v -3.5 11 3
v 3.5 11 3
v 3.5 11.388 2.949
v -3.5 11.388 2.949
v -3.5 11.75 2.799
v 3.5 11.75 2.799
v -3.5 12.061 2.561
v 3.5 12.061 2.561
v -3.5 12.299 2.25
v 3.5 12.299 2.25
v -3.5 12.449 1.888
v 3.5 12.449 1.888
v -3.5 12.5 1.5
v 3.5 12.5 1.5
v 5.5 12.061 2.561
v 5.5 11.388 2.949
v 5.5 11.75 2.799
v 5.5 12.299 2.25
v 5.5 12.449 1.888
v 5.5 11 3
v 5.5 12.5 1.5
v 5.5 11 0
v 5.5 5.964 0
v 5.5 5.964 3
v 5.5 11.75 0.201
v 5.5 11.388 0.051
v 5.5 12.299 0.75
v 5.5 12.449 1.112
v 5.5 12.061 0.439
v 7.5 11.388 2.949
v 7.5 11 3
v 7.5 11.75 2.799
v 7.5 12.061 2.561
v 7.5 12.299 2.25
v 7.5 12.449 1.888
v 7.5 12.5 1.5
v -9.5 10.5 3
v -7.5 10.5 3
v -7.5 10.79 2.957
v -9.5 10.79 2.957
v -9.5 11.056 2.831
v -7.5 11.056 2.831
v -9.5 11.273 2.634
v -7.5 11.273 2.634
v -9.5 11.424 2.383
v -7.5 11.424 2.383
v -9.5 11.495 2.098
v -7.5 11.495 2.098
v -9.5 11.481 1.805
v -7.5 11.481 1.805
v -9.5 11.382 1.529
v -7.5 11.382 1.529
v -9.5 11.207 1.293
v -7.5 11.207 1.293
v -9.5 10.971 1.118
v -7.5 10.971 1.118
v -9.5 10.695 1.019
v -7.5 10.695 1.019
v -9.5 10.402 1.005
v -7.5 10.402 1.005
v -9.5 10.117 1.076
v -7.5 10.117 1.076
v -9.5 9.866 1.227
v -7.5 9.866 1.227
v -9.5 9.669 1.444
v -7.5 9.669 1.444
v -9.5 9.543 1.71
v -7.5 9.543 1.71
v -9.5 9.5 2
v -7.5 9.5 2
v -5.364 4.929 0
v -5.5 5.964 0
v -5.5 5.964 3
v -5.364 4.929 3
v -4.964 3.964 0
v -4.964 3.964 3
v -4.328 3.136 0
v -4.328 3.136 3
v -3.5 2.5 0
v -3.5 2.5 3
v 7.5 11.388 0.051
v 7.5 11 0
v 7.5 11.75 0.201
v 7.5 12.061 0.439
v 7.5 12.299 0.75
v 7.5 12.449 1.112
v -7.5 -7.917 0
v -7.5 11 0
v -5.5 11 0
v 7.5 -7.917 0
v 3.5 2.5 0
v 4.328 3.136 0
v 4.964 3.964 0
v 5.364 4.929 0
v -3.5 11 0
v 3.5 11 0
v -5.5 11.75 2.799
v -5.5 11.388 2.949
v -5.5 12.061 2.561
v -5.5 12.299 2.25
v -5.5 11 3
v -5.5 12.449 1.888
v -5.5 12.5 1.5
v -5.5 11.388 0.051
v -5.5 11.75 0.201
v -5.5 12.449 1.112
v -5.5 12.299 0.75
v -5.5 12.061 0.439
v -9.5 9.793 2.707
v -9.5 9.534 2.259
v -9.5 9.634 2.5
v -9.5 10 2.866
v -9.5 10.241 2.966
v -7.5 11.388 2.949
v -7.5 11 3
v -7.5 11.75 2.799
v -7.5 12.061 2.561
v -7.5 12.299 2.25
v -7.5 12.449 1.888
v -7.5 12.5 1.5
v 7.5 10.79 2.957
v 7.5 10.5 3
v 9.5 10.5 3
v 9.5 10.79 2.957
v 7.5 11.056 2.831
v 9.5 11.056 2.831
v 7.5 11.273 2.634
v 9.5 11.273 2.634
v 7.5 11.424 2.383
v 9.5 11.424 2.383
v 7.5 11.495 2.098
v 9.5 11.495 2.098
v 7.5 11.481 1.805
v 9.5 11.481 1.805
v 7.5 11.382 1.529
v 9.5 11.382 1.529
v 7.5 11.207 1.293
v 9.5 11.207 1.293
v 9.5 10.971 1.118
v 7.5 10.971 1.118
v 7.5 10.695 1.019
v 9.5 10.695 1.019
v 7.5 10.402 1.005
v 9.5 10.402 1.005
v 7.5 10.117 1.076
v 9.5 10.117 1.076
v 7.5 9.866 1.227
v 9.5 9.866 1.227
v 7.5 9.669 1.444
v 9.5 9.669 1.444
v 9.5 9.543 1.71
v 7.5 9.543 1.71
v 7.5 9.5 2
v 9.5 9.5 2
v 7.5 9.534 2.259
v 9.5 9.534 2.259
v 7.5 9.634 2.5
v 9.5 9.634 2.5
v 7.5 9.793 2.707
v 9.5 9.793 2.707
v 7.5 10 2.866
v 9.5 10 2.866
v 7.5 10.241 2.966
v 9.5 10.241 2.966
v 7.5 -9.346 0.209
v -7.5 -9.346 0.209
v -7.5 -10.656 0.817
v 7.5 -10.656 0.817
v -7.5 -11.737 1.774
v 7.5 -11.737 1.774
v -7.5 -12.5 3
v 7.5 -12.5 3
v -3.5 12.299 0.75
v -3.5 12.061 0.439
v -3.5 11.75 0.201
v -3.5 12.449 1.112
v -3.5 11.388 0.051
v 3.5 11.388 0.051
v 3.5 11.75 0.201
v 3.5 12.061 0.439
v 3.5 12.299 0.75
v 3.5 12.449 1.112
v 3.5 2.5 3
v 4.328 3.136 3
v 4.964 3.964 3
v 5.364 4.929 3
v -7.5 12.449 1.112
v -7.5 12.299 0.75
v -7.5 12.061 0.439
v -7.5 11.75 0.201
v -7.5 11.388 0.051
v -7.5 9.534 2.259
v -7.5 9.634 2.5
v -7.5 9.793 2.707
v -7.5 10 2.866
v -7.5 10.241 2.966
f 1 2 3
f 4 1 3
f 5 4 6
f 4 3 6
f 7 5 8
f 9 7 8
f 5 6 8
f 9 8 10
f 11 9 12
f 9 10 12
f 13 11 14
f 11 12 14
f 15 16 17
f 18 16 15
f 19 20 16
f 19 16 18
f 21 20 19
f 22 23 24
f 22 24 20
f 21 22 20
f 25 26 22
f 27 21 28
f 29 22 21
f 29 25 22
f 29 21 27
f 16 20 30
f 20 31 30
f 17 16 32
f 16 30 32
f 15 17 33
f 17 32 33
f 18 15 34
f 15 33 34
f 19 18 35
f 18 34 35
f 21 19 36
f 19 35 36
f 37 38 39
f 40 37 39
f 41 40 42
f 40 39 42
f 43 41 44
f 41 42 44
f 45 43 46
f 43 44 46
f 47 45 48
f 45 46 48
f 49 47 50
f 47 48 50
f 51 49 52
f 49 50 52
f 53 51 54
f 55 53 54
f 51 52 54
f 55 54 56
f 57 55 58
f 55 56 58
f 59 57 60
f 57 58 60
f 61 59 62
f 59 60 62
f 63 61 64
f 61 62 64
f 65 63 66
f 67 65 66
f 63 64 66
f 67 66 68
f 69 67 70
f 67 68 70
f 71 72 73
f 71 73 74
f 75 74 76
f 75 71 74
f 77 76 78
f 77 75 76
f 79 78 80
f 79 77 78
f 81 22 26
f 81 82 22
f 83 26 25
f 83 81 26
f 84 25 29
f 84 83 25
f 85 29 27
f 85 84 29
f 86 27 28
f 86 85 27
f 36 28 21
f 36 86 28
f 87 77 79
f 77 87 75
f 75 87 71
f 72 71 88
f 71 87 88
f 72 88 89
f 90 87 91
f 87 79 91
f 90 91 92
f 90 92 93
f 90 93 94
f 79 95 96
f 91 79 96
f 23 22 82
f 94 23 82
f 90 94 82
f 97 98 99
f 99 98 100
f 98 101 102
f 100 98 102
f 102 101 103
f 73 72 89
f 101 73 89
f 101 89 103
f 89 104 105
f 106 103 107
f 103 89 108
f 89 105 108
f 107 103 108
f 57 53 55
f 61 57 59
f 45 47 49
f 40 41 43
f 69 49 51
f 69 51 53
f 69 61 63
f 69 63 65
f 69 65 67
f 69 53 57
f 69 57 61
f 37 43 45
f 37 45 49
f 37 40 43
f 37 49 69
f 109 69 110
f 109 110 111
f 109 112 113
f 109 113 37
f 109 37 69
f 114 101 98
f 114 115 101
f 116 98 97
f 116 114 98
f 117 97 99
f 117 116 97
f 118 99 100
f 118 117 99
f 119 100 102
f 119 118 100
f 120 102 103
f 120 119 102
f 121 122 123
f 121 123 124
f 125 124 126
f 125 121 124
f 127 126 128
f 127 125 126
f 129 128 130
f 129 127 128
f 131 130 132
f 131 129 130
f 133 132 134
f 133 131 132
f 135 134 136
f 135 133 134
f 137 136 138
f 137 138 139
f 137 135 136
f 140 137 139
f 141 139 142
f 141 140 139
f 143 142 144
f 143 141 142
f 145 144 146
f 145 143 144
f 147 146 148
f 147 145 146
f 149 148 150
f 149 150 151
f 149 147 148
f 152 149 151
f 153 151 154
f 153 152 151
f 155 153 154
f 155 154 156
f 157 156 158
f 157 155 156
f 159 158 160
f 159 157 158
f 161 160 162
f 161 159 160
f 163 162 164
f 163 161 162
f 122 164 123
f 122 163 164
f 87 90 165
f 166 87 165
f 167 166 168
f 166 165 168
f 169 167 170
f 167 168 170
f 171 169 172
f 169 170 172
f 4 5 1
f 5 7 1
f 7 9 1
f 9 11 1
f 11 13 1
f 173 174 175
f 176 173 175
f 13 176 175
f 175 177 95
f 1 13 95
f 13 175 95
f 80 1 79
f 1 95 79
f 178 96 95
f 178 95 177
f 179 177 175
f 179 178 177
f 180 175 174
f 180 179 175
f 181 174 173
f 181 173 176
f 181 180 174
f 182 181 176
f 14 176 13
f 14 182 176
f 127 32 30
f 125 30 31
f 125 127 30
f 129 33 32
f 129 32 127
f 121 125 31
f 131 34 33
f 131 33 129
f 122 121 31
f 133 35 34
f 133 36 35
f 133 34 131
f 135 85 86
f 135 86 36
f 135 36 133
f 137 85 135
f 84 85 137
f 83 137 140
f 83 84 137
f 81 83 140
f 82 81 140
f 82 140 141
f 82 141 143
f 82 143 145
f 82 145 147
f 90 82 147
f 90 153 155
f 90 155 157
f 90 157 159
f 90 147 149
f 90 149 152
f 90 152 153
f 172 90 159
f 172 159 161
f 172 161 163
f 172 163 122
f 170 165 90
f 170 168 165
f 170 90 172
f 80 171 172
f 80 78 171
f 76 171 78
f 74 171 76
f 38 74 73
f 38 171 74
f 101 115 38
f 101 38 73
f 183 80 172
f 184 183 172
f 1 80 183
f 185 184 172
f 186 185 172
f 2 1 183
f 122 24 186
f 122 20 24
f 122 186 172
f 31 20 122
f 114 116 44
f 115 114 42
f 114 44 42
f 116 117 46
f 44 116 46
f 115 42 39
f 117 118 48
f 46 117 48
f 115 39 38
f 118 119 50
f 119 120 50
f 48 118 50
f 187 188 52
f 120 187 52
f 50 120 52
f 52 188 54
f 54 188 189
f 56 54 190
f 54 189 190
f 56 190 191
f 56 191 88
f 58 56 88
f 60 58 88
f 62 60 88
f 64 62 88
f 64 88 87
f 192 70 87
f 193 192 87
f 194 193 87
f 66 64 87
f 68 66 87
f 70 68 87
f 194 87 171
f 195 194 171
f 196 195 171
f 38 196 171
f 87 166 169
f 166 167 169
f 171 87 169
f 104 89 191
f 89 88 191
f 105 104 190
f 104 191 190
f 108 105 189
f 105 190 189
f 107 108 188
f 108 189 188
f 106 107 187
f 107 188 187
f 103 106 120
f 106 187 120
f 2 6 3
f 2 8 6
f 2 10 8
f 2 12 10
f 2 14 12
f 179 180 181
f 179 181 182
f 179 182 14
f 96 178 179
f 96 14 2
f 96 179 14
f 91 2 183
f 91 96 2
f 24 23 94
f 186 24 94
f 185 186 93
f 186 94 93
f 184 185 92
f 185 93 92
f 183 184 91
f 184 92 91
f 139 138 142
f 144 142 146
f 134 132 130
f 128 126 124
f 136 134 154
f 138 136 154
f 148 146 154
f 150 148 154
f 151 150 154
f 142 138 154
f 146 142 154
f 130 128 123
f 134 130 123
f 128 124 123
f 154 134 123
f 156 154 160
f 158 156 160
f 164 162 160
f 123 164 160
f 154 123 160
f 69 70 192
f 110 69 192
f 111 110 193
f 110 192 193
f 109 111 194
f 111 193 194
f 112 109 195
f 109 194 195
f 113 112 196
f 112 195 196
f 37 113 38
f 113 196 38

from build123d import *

# Parameters (mm, degrees)
F1_DEPTH    = 3
F3_DEPTH    = 2
F4_R        = 1.49999
F5_T1_DEPTH = 3
F6_T1_DEPTH = 30.4128784748


# Not quite as in the source:
# - a fillet or chamfer that OpenCascade refuses, or shapes differently, is made with other operations: its cross-section is extruded or revolved along the edge and cut away or added
# - a fillet or chamfer is up to 0.001 mm smaller than in the source, because OpenCascade refuses the exact size
# - a feature names something its author has since deleted; it is built from what else it names


with BuildPart() as f1:
    # F0 (on Top) → F1 (new body)
    with BuildSketch(Plane.XY):
        Polygon((-7.5, 12.5), (-7.5, -12.5), (0, -12.5), (0, 12.5), (-3.5, 12.5), (-3.5, 2.5), (-5.5, 2.5), (-5.5, 12.5), align=None)
    extrude(amount=F1_DEPTH)

    # F2 (on face) → F3 (join)
    with BuildSketch(Plane(origin=(-7.5, 0, 0), x_dir=(0, -1, 0), z_dir=(-1, 0, 0))):
        with BuildLine():
            ThreePointArc((-10.4999999883, 3), (-11.2071067853, 1.2928932229), (-9.5, 2))
            ThreePointArc((-9.5, 2), (-9.7928932147, 2.7071067771), (-10.4999999883, 3))
        make_face()
    extrude(amount=F3_DEPTH)

    # F4 (radius 1.5 in the source; OpenCascade refuses exactly that, so slightly less here)
    f4_edges = [f1.edges().sort_by_distance(p)[0] for p in [
        (-6.5, 12.5, 0),
        (-6.5, 12.5, 3),
        (-1.75, 12.5, 0),
        (-1.75, 12.5, 3),
    ]]
    fillet(f4_edges, radius=F4_R)

    # F5: fillet of radius 4 on 1 edges, made by hand

    # F5_s2 → F5_t1 (join)
    with BuildSketch(Plane.XY):
        with BuildLine():
            ThreePointArc((-5.5, 5.9641016151), (-4.9641016151, 3.9641016151), (-3.5, 2.5))
            Line((-3.5, 2.5), (-5.5, 2.5))
            Line((-5.5, 2.5), (-5.5, 5.9641016151))
        make_face()
    extrude(amount=F5_T1_DEPTH)

    # F6: fillet of radius 5 on 1 edges, made by hand

    # F6_s2 → F6_t1 (cut)
    with BuildSketch(Plane.YZ.offset(-18.9564392374)):
        with BuildLine():
            ThreePointArc((-7.917424305, 0), (-10.6560370926, 0.8166998673), (-12.5, 3))
            Line((-12.5, 3), (-12.5, 0))
            Line((-12.5, 0), (-7.917424305, 0))
        make_face()
    extrude(amount=F6_T1_DEPTH, mode=Mode.SUBTRACT)

    # F7: F1 across face


with BuildPart() as f1_1:
    add(f1.part)
    add(f1.part.mirror(Plane(origin=(0, 0.4580070694, 1.5370600849), x_dir=(0, 1, 0), z_dir=(1, 0, 0))))


solid = f1_1.part
